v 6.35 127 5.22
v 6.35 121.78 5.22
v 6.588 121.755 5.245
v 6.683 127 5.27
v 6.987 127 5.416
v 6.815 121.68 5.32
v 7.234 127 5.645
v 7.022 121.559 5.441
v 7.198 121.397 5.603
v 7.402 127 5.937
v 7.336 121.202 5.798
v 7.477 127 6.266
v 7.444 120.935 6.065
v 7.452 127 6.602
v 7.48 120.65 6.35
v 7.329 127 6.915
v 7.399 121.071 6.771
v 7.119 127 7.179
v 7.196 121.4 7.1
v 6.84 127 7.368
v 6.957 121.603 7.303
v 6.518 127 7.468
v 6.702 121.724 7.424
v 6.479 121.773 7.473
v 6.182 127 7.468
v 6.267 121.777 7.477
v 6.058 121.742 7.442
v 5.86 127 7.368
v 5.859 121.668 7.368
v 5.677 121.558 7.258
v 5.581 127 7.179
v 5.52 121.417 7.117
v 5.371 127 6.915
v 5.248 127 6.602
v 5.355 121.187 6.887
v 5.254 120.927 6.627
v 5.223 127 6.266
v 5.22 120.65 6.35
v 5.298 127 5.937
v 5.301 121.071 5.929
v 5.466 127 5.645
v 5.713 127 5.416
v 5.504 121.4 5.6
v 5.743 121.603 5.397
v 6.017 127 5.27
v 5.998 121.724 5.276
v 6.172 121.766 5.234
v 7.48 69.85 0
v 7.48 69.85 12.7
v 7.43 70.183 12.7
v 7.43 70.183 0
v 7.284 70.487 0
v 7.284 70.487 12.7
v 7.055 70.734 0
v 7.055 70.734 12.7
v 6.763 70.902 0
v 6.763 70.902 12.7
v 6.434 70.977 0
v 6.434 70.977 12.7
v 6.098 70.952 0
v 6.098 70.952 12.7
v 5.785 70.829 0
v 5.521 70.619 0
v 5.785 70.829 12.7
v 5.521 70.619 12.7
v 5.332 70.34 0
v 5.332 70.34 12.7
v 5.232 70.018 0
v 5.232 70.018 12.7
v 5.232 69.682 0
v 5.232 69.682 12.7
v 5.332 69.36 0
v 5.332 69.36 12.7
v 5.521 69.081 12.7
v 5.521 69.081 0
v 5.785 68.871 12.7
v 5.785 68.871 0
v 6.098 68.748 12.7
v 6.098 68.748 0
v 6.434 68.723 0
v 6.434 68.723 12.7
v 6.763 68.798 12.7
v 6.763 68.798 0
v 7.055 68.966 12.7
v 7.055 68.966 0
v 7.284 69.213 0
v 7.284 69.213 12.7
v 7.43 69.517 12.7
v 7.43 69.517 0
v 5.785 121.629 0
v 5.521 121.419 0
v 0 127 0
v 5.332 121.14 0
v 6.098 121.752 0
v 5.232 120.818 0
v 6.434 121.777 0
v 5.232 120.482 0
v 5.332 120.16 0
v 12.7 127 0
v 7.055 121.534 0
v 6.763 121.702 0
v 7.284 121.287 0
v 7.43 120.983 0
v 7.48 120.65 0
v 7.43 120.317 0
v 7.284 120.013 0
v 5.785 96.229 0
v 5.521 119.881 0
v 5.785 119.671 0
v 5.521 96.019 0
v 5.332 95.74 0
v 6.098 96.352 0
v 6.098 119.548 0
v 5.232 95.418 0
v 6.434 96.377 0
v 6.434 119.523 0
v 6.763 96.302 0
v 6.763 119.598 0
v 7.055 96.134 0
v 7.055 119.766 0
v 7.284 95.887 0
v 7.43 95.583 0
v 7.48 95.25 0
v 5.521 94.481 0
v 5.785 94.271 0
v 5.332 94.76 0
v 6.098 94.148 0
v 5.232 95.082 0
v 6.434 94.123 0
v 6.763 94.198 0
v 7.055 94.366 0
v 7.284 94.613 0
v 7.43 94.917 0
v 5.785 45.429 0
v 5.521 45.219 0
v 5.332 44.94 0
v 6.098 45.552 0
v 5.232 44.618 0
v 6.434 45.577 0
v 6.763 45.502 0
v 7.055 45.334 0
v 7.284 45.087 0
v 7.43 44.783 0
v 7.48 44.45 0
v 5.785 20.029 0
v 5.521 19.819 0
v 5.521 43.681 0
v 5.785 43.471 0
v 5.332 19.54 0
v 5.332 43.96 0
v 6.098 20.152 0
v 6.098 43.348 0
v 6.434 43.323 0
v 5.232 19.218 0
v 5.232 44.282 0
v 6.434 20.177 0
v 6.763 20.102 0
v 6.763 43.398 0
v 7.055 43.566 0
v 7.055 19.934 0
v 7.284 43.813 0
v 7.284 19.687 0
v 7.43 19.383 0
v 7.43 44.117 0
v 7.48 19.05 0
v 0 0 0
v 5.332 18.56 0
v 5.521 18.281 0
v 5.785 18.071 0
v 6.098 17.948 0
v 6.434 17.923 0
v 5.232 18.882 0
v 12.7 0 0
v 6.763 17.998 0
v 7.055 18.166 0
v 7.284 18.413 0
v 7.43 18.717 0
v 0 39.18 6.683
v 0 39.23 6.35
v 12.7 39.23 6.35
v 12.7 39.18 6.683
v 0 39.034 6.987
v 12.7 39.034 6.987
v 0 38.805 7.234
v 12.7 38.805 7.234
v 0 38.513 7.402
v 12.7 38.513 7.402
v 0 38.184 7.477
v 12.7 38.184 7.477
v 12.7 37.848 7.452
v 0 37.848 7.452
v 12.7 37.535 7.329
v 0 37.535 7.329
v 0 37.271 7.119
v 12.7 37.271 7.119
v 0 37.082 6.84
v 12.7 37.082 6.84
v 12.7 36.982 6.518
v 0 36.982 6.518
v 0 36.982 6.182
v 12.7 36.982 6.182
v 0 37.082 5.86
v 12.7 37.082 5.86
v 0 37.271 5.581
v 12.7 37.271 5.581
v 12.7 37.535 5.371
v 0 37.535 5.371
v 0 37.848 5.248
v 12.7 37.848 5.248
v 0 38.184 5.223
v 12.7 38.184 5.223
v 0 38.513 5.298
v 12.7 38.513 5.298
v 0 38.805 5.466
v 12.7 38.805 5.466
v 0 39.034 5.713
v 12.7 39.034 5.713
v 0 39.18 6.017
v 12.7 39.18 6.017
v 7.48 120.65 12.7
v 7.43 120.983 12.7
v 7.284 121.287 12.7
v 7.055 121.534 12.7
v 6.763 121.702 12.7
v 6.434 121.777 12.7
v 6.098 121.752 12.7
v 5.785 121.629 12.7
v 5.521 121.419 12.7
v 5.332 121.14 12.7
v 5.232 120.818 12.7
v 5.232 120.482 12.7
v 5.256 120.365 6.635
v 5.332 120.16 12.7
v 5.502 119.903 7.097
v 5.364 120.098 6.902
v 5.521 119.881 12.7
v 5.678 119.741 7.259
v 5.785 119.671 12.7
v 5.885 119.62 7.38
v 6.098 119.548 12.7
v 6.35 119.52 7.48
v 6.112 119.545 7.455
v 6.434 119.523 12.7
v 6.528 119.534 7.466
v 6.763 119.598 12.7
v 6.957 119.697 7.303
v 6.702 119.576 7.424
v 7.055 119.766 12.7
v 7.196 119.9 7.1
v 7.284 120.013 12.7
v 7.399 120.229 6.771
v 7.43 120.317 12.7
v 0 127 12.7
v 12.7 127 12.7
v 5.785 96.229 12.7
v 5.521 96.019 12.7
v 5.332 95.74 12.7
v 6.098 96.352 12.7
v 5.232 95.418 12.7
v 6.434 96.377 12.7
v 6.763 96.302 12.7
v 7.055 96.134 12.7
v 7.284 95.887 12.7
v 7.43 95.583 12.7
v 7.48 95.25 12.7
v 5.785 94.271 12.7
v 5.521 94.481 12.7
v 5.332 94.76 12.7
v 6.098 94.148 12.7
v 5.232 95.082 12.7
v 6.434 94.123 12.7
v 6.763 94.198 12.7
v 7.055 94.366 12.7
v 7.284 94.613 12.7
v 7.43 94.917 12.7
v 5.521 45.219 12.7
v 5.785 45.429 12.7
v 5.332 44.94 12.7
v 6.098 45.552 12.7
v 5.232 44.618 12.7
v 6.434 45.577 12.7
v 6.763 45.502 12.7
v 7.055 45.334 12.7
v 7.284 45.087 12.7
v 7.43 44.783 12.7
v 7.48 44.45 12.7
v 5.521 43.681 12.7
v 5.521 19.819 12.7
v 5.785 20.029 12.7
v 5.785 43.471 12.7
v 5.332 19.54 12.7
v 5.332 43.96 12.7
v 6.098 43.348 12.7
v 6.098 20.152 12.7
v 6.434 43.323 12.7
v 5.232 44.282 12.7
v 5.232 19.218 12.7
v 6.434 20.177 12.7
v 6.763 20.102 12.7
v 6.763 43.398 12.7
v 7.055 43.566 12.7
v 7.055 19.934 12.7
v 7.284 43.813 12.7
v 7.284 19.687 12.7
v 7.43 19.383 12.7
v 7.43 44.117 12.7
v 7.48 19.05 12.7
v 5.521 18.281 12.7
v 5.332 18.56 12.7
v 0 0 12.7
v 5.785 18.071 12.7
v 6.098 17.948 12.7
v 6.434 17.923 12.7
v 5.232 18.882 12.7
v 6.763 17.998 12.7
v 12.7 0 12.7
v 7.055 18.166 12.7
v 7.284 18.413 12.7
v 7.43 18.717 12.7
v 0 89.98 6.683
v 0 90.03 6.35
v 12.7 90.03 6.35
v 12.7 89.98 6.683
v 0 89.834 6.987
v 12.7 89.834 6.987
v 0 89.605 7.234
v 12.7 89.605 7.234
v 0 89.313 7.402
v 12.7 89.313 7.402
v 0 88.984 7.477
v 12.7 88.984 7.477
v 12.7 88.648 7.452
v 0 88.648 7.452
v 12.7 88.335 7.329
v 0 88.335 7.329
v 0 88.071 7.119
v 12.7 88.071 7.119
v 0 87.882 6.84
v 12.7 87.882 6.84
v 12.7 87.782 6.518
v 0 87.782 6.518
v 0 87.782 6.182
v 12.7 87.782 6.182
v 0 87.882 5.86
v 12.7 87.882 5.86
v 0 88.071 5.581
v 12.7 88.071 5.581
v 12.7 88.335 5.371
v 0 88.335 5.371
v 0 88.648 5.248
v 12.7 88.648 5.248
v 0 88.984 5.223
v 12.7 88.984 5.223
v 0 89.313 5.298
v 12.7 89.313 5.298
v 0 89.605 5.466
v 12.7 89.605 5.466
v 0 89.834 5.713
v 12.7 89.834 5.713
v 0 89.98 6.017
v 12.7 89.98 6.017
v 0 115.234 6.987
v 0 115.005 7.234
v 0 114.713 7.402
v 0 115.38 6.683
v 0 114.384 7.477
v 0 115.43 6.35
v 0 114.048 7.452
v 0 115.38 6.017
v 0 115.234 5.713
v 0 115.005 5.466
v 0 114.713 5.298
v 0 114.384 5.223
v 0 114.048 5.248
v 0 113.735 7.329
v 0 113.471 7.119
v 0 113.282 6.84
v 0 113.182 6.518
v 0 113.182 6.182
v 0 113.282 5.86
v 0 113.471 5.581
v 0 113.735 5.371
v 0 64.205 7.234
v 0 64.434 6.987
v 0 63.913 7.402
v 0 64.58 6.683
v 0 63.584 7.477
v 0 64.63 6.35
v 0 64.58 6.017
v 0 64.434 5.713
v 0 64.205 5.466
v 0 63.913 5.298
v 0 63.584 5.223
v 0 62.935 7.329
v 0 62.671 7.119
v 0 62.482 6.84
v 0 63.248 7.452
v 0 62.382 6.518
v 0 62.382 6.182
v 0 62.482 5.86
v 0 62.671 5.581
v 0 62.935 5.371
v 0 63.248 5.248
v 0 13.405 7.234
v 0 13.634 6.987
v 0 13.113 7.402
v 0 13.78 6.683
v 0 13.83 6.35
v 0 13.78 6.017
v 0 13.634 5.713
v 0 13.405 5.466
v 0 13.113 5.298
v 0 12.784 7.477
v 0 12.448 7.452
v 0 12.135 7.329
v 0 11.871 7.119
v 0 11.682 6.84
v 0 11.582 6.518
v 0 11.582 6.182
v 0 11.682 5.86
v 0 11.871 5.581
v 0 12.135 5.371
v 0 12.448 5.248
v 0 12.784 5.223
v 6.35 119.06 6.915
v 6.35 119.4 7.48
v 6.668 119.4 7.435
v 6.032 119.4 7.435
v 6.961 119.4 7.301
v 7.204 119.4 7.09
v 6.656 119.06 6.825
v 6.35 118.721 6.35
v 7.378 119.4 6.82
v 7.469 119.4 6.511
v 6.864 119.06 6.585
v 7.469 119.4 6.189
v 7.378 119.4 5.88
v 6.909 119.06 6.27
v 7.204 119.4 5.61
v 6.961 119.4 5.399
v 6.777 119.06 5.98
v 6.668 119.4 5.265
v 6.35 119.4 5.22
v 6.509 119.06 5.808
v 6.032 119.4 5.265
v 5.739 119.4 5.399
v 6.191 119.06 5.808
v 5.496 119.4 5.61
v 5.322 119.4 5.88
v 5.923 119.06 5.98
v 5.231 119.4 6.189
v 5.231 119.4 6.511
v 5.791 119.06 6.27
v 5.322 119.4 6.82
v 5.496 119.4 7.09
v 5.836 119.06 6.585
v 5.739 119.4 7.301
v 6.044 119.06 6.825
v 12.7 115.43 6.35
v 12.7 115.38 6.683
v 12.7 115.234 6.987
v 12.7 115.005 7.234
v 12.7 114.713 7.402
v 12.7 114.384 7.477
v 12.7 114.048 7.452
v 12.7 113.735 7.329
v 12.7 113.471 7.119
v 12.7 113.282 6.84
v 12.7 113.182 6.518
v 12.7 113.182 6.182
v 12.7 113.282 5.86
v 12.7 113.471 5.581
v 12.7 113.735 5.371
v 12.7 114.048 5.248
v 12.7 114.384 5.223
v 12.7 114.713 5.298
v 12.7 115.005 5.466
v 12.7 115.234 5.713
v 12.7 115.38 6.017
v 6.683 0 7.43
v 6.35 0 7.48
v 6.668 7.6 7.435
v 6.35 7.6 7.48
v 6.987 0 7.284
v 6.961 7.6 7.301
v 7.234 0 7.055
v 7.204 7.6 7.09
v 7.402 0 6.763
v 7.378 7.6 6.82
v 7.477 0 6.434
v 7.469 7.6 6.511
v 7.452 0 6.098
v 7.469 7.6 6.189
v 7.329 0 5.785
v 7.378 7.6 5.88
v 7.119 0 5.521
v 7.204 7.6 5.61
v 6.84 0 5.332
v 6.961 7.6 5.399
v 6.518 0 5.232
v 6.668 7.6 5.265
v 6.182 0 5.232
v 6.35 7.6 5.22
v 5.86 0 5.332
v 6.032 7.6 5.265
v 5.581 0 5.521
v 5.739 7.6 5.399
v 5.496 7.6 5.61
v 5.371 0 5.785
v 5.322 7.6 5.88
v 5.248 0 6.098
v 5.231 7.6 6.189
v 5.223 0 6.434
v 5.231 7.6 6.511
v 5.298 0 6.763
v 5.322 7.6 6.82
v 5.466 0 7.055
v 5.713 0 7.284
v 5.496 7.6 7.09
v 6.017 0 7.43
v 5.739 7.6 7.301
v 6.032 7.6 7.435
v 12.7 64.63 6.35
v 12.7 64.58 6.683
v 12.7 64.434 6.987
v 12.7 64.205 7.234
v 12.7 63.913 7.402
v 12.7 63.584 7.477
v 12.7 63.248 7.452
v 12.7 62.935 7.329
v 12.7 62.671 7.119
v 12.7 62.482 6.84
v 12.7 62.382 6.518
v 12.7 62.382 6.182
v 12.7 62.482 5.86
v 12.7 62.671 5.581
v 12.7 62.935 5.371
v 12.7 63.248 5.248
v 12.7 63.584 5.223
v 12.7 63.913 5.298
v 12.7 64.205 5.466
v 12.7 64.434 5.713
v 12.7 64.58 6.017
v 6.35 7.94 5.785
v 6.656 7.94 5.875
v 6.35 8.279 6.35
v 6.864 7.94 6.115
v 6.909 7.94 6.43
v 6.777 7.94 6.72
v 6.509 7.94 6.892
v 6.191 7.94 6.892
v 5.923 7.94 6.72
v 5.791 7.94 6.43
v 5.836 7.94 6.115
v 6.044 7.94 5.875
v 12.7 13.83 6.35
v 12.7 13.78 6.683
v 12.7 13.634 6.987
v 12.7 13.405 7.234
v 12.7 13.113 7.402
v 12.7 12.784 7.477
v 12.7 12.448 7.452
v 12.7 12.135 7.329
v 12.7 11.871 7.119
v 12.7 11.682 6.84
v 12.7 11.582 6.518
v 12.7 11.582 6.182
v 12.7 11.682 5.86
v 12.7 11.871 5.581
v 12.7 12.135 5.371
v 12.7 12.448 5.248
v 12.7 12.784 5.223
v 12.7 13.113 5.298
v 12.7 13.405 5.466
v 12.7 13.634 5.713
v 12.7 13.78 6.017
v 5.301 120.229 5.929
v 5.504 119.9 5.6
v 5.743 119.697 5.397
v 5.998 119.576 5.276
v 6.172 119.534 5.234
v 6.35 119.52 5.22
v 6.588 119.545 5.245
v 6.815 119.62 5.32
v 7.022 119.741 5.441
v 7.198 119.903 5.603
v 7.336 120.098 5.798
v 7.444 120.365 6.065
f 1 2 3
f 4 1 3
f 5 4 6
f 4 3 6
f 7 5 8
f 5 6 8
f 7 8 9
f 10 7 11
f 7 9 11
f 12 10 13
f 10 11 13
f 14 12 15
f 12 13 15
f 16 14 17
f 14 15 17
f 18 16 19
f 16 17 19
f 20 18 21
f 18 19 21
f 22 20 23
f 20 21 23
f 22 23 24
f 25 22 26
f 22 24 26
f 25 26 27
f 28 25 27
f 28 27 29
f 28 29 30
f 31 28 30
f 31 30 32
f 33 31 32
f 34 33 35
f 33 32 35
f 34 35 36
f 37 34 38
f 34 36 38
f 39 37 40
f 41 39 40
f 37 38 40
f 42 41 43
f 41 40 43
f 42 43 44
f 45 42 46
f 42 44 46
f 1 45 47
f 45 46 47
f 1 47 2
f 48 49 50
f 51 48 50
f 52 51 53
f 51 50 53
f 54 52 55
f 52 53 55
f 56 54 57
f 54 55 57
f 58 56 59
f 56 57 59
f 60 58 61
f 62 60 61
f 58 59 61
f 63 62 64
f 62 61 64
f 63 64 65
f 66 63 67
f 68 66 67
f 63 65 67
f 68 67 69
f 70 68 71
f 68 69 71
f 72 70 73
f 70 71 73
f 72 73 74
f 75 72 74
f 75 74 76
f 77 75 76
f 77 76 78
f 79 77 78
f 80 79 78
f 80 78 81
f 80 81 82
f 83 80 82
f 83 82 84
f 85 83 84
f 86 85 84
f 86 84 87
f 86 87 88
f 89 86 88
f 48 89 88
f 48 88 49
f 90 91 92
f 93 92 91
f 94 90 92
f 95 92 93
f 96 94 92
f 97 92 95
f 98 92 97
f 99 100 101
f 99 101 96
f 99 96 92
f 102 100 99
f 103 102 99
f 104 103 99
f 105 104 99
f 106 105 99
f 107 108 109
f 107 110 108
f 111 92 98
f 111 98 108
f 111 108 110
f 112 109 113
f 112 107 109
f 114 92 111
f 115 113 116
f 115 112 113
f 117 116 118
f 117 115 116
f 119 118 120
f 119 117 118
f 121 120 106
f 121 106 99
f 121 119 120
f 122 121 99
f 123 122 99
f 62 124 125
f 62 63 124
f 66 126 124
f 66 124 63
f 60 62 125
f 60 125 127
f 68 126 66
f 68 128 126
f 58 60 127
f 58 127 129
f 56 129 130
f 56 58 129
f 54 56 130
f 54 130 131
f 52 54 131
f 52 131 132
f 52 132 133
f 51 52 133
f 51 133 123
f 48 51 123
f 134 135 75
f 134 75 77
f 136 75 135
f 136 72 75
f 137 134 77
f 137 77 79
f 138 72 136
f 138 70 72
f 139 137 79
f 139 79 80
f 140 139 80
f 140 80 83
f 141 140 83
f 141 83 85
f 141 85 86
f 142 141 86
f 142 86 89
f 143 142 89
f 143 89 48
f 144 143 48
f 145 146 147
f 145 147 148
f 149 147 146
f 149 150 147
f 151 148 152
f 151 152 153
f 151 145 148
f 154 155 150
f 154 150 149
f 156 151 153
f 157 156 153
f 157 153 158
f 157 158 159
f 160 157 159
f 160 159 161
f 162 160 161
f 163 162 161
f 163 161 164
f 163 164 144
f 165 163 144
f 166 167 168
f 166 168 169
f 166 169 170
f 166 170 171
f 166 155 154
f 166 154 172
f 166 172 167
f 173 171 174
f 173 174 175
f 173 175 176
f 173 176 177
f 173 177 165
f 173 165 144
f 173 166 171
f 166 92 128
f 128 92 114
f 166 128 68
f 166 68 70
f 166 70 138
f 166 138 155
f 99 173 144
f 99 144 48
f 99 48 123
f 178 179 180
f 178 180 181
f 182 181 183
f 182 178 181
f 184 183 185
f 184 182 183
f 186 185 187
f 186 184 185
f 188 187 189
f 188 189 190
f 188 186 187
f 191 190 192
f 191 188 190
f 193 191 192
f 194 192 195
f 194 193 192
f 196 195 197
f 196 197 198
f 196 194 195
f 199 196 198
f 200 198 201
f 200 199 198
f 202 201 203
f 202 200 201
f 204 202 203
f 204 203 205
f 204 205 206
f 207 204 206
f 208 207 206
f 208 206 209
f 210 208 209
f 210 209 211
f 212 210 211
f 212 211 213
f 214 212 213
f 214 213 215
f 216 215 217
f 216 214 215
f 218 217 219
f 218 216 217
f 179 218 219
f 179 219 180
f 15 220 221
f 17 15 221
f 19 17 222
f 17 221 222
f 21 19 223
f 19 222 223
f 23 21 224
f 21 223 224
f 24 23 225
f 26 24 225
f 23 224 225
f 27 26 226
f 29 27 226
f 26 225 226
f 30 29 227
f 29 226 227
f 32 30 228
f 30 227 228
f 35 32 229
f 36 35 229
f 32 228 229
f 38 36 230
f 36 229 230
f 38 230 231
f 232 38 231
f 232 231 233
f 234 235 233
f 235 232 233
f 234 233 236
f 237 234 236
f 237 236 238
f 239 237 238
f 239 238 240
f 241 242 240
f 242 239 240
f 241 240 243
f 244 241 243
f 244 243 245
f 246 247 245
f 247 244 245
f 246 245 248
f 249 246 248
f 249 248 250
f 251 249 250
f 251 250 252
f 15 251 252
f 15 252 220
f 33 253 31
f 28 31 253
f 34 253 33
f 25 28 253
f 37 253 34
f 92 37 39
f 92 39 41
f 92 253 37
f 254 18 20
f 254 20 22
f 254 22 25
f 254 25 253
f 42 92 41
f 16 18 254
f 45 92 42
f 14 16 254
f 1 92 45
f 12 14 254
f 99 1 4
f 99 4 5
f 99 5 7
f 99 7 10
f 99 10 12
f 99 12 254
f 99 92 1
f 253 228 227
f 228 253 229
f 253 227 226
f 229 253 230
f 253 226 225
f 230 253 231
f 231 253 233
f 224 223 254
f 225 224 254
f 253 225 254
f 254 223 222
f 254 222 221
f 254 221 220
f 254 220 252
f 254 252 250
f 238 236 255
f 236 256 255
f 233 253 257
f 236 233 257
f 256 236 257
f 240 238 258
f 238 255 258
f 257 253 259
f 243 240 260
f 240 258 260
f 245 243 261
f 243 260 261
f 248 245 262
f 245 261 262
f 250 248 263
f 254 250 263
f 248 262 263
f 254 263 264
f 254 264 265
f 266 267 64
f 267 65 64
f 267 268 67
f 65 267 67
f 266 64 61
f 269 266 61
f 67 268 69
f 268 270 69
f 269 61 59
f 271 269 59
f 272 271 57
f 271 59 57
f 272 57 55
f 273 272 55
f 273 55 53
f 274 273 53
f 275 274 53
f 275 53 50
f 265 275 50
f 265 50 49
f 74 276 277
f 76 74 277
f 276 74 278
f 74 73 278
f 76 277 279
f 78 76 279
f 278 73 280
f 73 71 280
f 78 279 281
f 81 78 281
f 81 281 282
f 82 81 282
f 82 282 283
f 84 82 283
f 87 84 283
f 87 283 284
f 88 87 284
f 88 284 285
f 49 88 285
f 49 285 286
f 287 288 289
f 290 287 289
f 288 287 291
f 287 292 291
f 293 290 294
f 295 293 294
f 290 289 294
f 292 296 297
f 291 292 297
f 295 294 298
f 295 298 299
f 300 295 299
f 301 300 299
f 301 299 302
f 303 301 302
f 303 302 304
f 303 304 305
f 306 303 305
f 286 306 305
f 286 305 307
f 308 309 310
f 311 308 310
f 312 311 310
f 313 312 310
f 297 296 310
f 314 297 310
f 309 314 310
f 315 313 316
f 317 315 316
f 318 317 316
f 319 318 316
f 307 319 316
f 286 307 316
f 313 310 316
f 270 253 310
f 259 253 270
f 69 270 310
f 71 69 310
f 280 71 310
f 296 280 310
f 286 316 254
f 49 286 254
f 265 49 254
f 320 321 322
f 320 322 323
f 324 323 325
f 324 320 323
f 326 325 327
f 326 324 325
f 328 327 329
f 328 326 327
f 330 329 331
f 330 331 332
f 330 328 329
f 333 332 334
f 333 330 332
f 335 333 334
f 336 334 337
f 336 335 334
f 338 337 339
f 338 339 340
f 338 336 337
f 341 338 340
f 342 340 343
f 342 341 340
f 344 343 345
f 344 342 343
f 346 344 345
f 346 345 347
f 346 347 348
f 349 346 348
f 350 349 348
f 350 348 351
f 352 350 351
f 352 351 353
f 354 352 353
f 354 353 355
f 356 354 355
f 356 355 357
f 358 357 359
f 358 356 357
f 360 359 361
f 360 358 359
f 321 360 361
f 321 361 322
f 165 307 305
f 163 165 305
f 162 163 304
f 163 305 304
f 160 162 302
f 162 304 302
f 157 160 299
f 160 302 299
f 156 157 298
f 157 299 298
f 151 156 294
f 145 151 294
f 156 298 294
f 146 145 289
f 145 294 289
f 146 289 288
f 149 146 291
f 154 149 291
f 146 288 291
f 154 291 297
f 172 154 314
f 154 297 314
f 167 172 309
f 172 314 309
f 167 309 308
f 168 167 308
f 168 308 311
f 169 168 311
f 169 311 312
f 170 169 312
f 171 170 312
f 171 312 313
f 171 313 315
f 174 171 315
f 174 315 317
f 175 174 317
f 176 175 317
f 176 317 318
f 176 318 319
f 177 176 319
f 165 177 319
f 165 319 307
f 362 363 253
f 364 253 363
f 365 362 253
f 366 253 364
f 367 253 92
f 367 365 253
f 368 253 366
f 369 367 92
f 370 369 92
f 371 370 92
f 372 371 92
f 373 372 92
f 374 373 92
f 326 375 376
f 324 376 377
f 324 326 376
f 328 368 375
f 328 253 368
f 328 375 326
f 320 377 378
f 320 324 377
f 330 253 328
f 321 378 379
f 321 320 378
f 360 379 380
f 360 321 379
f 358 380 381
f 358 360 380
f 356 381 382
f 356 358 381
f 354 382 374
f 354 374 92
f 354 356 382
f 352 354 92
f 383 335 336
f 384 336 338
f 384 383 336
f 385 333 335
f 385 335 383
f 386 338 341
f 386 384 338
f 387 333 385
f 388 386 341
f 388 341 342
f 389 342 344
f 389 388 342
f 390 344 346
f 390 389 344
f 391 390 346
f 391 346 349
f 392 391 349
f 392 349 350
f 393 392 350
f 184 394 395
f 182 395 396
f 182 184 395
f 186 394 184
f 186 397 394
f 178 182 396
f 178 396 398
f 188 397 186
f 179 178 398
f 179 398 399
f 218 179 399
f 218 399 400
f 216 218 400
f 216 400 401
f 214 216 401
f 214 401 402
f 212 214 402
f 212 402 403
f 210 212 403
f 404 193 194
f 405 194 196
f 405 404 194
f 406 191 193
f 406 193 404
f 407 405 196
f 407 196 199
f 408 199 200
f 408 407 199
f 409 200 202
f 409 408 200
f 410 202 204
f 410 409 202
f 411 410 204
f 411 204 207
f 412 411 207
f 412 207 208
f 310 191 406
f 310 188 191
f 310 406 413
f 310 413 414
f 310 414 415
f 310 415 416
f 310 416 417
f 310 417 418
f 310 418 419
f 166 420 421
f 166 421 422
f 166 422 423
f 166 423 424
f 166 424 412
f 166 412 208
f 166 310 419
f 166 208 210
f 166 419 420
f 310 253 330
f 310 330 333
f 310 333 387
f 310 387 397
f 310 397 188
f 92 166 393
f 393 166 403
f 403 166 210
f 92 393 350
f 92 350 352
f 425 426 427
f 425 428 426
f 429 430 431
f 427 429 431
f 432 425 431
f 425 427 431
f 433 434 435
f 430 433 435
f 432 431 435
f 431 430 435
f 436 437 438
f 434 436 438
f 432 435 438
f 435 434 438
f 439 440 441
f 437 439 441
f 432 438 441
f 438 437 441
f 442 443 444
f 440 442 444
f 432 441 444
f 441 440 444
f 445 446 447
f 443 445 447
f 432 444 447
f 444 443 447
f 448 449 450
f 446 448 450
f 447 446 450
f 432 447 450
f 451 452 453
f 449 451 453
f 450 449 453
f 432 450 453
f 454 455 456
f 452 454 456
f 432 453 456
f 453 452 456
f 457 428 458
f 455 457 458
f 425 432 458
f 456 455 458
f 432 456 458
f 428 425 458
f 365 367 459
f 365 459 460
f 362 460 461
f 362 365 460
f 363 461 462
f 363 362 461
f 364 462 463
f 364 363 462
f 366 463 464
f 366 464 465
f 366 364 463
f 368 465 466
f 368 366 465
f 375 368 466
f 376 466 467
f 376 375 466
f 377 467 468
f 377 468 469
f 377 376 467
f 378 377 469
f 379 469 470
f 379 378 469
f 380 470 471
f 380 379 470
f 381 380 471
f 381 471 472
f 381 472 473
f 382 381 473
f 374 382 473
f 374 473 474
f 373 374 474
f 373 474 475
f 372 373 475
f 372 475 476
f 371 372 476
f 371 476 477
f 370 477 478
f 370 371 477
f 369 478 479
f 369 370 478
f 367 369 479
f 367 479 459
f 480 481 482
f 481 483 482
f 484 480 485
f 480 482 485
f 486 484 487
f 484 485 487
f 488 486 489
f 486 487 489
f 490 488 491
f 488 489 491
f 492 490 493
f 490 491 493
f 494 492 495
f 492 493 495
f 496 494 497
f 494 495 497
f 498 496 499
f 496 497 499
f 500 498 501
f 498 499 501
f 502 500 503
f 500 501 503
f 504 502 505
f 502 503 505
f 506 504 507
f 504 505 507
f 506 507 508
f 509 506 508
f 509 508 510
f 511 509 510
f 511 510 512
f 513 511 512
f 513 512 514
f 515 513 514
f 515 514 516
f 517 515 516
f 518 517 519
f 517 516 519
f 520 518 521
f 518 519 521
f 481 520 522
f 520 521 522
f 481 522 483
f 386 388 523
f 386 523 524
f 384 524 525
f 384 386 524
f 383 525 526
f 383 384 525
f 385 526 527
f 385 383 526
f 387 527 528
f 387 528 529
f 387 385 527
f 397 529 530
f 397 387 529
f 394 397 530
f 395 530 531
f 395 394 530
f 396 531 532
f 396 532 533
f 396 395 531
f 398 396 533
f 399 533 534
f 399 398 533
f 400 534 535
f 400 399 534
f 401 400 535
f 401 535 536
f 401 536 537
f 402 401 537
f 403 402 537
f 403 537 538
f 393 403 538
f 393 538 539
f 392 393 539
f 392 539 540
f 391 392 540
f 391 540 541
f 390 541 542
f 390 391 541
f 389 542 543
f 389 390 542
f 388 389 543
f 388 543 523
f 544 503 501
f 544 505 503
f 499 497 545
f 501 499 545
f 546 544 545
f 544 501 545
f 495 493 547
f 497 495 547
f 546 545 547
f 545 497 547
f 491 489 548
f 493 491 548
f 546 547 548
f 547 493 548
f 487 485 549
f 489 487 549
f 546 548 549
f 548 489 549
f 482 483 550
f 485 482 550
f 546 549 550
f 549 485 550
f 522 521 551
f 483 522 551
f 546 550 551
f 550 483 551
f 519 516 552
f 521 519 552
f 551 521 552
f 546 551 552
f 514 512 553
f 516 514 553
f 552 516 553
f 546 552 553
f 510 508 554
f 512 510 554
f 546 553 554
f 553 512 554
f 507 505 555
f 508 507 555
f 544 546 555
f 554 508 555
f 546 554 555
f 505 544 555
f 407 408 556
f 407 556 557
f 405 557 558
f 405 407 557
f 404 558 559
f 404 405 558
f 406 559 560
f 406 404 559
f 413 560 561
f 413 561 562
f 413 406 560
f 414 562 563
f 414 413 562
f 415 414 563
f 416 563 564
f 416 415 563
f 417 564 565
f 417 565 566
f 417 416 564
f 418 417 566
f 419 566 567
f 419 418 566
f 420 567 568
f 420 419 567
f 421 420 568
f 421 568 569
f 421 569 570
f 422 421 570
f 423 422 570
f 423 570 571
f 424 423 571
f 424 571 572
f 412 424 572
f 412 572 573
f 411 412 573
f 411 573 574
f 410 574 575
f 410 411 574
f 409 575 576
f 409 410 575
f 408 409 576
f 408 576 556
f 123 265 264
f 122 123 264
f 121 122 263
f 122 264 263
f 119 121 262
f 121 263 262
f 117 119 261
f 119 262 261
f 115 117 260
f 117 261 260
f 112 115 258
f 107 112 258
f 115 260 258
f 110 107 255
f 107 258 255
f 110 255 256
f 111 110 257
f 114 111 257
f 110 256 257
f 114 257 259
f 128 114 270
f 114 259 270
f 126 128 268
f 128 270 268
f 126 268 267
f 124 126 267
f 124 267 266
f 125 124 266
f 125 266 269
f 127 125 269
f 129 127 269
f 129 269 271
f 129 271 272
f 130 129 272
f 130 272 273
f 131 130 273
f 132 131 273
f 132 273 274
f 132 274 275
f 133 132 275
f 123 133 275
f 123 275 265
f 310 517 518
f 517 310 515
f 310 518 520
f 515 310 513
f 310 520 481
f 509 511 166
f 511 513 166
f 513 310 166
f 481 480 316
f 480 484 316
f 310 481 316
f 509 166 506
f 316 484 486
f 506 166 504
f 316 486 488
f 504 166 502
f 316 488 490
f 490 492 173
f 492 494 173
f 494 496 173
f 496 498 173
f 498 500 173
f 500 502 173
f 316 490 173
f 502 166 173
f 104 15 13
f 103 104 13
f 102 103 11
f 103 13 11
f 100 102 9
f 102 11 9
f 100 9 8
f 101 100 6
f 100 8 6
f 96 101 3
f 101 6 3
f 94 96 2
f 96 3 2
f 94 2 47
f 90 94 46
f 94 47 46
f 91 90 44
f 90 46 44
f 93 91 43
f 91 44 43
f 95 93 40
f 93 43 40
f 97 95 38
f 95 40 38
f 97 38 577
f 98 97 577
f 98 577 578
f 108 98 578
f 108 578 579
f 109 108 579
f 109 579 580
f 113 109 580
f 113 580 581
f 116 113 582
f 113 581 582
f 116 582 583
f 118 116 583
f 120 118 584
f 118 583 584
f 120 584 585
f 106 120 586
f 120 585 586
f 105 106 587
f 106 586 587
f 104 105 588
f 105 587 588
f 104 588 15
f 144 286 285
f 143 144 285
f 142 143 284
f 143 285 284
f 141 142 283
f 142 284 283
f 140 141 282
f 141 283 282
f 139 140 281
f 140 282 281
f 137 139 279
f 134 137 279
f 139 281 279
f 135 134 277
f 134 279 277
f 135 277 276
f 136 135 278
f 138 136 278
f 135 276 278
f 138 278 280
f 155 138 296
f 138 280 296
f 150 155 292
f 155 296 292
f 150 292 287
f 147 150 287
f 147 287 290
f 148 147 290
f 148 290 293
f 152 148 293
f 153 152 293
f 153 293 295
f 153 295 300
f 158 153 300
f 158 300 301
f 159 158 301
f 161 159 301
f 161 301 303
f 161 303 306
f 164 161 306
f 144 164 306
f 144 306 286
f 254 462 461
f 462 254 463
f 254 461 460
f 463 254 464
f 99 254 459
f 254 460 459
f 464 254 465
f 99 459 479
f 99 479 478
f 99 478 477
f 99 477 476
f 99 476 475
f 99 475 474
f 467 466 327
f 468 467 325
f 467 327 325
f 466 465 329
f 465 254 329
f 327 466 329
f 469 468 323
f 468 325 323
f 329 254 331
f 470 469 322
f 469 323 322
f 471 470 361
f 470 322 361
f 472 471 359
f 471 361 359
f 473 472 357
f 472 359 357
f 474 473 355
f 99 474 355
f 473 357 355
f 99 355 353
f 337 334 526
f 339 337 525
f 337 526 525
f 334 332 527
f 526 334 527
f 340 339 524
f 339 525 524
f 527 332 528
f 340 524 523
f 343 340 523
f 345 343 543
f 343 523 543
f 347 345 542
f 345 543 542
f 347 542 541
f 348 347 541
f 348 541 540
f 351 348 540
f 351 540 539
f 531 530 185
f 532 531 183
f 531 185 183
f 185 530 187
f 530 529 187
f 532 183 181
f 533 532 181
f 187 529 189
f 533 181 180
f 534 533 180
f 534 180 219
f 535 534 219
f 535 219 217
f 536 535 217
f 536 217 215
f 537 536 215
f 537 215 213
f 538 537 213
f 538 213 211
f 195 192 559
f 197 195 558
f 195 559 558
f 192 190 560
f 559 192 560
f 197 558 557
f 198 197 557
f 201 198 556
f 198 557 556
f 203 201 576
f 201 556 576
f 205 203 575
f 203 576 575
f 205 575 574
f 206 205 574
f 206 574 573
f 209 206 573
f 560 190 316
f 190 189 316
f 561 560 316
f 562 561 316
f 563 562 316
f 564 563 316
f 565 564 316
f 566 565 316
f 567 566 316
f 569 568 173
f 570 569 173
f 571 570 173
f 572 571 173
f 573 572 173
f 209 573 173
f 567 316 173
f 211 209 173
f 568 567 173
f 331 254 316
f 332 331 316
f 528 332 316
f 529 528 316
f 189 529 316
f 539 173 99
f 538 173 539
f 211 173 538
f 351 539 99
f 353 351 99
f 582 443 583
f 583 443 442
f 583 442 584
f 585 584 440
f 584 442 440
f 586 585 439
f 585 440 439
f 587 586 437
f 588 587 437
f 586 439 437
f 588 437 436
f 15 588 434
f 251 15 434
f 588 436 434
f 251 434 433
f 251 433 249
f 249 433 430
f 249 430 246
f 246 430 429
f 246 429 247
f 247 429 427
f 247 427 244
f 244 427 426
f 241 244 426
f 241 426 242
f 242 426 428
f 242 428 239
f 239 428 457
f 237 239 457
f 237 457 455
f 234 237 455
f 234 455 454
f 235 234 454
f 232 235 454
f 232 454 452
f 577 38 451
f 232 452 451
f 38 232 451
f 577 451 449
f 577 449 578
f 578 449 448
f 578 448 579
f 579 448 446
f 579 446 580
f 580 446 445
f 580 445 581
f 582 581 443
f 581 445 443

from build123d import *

# Parameters (mm, degrees)
SKETCH1_W                           = 12.7
SKETCH1_H                           = 12.7
BOSS_EXTRUDE1_DEPTH                 = 127
F_4_40_TAPPED_HOLE1_D               = 2.2606
F_4_40_TAPPED_HOLE1_DEPTH           = 7.6
F_4_40_TAPPED_HOLE1_TIP             = 0.679152758
F_4_40_TAPPED_HOLE1_ON_FACE_2_D     = 2.2606
F_4_40_TAPPED_HOLE1_ON_FACE_2_DEPTH = 7.6
F_4_40_TAPPED_HOLE1_ON_FACE_2_TIP   = 0.679152758
F_4_40_TAPPED_HOLE2_D               = 2.2606
LPATTERN1_COUNT                     = 5
LPATTERN1_PITCH                     = 25.4
F_4_40_TAPPED_HOLE3_OUTLINE_R       = 1.1303
F_4_40_TAPPED_HOLE3_DEPTH           = 12.7
LPATTERN2_COUNT                     = 5
LPATTERN2_PITCH                     = 25.4


# Read off the part's stored shape, not the designer's step: #4-40 Tapped Hole3
with BuildPart() as part:
    # Sketch1 → Boss-Extrude1 (new body)
    with BuildSketch(Plane(origin=(0, 0, 0), x_dir=(1, 0, 0), z_dir=(0, 1, 0))):
        with Locations((6.35, -6.35)):
            Rectangle(SKETCH1_W, SKETCH1_H)
    extrude(amount=BOSS_EXTRUDE1_DEPTH)

    # #4-40 Tapped Hole1
    with Locations(Plane(origin=(6.35, 127, 6.35), x_dir=(0, 0, 1), z_dir=(0, 1, 0))):
        with Locations((0, 0)):
            Hole(F_4_40_TAPPED_HOLE1_D / 2, depth=F_4_40_TAPPED_HOLE1_DEPTH)
            with Locations((0, 0, -(F_4_40_TAPPED_HOLE1_DEPTH + F_4_40_TAPPED_HOLE1_TIP / 2))):  # 118° drill point
                Cone(0, F_4_40_TAPPED_HOLE1_D / 2, F_4_40_TAPPED_HOLE1_TIP, mode=Mode.SUBTRACT)

    # #4-40 Tapped Hole1 on face 2
    with Locations(Plane(origin=(6.35, 0, 6.35), x_dir=(0, 0, -1), z_dir=(0, -1, 0))):
        with Locations((0, 0)):
            Hole(F_4_40_TAPPED_HOLE1_ON_FACE_2_D / 2, depth=F_4_40_TAPPED_HOLE1_ON_FACE_2_DEPTH)
            with Locations((0, 0, -(F_4_40_TAPPED_HOLE1_ON_FACE_2_DEPTH + F_4_40_TAPPED_HOLE1_ON_FACE_2_TIP / 2))):  # 118° drill point
                Cone(0, F_4_40_TAPPED_HOLE1_ON_FACE_2_D / 2, F_4_40_TAPPED_HOLE1_ON_FACE_2_TIP, mode=Mode.SUBTRACT)

    # #4-40 Tapped Hole2 (through all)
    with Locations(Plane(origin=(6.35, 120.65, 0), x_dir=(-1, 0, 0), z_dir=(0, 0, -1))):
        with Locations((0, 0)):
            f_4_40_tapped_hole2 = Hole(F_4_40_TAPPED_HOLE2_D / 2)

    # LPattern1: #4-40 Tapped Hole2 ×5
    with Locations(*[(0, -i * LPATTERN1_PITCH, 0) for i in range(1, LPATTERN1_COUNT)]):
        add(f_4_40_tapped_hole2, mode=Mode.SUBTRACT)

    # #4-40 Tapped Hole3 outline → #4-40 Tapped Hole3 (cut)
    with BuildSketch(Plane.YZ):
        with Locations((114.3, 6.35)):
            Circle(F_4_40_TAPPED_HOLE3_OUTLINE_R)
    f_4_40_tapped_hole3 = extrude(amount=F_4_40_TAPPED_HOLE3_DEPTH, mode=Mode.SUBTRACT)

    # LPattern2: #4-40 Tapped Hole3 ×5
    with Locations(*[(0, -i * LPATTERN2_PITCH, 0) for i in range(1, LPATTERN2_COUNT)]):
        add(f_4_40_tapped_hole3, mode=Mode.SUBTRACT)


solid = part.part
